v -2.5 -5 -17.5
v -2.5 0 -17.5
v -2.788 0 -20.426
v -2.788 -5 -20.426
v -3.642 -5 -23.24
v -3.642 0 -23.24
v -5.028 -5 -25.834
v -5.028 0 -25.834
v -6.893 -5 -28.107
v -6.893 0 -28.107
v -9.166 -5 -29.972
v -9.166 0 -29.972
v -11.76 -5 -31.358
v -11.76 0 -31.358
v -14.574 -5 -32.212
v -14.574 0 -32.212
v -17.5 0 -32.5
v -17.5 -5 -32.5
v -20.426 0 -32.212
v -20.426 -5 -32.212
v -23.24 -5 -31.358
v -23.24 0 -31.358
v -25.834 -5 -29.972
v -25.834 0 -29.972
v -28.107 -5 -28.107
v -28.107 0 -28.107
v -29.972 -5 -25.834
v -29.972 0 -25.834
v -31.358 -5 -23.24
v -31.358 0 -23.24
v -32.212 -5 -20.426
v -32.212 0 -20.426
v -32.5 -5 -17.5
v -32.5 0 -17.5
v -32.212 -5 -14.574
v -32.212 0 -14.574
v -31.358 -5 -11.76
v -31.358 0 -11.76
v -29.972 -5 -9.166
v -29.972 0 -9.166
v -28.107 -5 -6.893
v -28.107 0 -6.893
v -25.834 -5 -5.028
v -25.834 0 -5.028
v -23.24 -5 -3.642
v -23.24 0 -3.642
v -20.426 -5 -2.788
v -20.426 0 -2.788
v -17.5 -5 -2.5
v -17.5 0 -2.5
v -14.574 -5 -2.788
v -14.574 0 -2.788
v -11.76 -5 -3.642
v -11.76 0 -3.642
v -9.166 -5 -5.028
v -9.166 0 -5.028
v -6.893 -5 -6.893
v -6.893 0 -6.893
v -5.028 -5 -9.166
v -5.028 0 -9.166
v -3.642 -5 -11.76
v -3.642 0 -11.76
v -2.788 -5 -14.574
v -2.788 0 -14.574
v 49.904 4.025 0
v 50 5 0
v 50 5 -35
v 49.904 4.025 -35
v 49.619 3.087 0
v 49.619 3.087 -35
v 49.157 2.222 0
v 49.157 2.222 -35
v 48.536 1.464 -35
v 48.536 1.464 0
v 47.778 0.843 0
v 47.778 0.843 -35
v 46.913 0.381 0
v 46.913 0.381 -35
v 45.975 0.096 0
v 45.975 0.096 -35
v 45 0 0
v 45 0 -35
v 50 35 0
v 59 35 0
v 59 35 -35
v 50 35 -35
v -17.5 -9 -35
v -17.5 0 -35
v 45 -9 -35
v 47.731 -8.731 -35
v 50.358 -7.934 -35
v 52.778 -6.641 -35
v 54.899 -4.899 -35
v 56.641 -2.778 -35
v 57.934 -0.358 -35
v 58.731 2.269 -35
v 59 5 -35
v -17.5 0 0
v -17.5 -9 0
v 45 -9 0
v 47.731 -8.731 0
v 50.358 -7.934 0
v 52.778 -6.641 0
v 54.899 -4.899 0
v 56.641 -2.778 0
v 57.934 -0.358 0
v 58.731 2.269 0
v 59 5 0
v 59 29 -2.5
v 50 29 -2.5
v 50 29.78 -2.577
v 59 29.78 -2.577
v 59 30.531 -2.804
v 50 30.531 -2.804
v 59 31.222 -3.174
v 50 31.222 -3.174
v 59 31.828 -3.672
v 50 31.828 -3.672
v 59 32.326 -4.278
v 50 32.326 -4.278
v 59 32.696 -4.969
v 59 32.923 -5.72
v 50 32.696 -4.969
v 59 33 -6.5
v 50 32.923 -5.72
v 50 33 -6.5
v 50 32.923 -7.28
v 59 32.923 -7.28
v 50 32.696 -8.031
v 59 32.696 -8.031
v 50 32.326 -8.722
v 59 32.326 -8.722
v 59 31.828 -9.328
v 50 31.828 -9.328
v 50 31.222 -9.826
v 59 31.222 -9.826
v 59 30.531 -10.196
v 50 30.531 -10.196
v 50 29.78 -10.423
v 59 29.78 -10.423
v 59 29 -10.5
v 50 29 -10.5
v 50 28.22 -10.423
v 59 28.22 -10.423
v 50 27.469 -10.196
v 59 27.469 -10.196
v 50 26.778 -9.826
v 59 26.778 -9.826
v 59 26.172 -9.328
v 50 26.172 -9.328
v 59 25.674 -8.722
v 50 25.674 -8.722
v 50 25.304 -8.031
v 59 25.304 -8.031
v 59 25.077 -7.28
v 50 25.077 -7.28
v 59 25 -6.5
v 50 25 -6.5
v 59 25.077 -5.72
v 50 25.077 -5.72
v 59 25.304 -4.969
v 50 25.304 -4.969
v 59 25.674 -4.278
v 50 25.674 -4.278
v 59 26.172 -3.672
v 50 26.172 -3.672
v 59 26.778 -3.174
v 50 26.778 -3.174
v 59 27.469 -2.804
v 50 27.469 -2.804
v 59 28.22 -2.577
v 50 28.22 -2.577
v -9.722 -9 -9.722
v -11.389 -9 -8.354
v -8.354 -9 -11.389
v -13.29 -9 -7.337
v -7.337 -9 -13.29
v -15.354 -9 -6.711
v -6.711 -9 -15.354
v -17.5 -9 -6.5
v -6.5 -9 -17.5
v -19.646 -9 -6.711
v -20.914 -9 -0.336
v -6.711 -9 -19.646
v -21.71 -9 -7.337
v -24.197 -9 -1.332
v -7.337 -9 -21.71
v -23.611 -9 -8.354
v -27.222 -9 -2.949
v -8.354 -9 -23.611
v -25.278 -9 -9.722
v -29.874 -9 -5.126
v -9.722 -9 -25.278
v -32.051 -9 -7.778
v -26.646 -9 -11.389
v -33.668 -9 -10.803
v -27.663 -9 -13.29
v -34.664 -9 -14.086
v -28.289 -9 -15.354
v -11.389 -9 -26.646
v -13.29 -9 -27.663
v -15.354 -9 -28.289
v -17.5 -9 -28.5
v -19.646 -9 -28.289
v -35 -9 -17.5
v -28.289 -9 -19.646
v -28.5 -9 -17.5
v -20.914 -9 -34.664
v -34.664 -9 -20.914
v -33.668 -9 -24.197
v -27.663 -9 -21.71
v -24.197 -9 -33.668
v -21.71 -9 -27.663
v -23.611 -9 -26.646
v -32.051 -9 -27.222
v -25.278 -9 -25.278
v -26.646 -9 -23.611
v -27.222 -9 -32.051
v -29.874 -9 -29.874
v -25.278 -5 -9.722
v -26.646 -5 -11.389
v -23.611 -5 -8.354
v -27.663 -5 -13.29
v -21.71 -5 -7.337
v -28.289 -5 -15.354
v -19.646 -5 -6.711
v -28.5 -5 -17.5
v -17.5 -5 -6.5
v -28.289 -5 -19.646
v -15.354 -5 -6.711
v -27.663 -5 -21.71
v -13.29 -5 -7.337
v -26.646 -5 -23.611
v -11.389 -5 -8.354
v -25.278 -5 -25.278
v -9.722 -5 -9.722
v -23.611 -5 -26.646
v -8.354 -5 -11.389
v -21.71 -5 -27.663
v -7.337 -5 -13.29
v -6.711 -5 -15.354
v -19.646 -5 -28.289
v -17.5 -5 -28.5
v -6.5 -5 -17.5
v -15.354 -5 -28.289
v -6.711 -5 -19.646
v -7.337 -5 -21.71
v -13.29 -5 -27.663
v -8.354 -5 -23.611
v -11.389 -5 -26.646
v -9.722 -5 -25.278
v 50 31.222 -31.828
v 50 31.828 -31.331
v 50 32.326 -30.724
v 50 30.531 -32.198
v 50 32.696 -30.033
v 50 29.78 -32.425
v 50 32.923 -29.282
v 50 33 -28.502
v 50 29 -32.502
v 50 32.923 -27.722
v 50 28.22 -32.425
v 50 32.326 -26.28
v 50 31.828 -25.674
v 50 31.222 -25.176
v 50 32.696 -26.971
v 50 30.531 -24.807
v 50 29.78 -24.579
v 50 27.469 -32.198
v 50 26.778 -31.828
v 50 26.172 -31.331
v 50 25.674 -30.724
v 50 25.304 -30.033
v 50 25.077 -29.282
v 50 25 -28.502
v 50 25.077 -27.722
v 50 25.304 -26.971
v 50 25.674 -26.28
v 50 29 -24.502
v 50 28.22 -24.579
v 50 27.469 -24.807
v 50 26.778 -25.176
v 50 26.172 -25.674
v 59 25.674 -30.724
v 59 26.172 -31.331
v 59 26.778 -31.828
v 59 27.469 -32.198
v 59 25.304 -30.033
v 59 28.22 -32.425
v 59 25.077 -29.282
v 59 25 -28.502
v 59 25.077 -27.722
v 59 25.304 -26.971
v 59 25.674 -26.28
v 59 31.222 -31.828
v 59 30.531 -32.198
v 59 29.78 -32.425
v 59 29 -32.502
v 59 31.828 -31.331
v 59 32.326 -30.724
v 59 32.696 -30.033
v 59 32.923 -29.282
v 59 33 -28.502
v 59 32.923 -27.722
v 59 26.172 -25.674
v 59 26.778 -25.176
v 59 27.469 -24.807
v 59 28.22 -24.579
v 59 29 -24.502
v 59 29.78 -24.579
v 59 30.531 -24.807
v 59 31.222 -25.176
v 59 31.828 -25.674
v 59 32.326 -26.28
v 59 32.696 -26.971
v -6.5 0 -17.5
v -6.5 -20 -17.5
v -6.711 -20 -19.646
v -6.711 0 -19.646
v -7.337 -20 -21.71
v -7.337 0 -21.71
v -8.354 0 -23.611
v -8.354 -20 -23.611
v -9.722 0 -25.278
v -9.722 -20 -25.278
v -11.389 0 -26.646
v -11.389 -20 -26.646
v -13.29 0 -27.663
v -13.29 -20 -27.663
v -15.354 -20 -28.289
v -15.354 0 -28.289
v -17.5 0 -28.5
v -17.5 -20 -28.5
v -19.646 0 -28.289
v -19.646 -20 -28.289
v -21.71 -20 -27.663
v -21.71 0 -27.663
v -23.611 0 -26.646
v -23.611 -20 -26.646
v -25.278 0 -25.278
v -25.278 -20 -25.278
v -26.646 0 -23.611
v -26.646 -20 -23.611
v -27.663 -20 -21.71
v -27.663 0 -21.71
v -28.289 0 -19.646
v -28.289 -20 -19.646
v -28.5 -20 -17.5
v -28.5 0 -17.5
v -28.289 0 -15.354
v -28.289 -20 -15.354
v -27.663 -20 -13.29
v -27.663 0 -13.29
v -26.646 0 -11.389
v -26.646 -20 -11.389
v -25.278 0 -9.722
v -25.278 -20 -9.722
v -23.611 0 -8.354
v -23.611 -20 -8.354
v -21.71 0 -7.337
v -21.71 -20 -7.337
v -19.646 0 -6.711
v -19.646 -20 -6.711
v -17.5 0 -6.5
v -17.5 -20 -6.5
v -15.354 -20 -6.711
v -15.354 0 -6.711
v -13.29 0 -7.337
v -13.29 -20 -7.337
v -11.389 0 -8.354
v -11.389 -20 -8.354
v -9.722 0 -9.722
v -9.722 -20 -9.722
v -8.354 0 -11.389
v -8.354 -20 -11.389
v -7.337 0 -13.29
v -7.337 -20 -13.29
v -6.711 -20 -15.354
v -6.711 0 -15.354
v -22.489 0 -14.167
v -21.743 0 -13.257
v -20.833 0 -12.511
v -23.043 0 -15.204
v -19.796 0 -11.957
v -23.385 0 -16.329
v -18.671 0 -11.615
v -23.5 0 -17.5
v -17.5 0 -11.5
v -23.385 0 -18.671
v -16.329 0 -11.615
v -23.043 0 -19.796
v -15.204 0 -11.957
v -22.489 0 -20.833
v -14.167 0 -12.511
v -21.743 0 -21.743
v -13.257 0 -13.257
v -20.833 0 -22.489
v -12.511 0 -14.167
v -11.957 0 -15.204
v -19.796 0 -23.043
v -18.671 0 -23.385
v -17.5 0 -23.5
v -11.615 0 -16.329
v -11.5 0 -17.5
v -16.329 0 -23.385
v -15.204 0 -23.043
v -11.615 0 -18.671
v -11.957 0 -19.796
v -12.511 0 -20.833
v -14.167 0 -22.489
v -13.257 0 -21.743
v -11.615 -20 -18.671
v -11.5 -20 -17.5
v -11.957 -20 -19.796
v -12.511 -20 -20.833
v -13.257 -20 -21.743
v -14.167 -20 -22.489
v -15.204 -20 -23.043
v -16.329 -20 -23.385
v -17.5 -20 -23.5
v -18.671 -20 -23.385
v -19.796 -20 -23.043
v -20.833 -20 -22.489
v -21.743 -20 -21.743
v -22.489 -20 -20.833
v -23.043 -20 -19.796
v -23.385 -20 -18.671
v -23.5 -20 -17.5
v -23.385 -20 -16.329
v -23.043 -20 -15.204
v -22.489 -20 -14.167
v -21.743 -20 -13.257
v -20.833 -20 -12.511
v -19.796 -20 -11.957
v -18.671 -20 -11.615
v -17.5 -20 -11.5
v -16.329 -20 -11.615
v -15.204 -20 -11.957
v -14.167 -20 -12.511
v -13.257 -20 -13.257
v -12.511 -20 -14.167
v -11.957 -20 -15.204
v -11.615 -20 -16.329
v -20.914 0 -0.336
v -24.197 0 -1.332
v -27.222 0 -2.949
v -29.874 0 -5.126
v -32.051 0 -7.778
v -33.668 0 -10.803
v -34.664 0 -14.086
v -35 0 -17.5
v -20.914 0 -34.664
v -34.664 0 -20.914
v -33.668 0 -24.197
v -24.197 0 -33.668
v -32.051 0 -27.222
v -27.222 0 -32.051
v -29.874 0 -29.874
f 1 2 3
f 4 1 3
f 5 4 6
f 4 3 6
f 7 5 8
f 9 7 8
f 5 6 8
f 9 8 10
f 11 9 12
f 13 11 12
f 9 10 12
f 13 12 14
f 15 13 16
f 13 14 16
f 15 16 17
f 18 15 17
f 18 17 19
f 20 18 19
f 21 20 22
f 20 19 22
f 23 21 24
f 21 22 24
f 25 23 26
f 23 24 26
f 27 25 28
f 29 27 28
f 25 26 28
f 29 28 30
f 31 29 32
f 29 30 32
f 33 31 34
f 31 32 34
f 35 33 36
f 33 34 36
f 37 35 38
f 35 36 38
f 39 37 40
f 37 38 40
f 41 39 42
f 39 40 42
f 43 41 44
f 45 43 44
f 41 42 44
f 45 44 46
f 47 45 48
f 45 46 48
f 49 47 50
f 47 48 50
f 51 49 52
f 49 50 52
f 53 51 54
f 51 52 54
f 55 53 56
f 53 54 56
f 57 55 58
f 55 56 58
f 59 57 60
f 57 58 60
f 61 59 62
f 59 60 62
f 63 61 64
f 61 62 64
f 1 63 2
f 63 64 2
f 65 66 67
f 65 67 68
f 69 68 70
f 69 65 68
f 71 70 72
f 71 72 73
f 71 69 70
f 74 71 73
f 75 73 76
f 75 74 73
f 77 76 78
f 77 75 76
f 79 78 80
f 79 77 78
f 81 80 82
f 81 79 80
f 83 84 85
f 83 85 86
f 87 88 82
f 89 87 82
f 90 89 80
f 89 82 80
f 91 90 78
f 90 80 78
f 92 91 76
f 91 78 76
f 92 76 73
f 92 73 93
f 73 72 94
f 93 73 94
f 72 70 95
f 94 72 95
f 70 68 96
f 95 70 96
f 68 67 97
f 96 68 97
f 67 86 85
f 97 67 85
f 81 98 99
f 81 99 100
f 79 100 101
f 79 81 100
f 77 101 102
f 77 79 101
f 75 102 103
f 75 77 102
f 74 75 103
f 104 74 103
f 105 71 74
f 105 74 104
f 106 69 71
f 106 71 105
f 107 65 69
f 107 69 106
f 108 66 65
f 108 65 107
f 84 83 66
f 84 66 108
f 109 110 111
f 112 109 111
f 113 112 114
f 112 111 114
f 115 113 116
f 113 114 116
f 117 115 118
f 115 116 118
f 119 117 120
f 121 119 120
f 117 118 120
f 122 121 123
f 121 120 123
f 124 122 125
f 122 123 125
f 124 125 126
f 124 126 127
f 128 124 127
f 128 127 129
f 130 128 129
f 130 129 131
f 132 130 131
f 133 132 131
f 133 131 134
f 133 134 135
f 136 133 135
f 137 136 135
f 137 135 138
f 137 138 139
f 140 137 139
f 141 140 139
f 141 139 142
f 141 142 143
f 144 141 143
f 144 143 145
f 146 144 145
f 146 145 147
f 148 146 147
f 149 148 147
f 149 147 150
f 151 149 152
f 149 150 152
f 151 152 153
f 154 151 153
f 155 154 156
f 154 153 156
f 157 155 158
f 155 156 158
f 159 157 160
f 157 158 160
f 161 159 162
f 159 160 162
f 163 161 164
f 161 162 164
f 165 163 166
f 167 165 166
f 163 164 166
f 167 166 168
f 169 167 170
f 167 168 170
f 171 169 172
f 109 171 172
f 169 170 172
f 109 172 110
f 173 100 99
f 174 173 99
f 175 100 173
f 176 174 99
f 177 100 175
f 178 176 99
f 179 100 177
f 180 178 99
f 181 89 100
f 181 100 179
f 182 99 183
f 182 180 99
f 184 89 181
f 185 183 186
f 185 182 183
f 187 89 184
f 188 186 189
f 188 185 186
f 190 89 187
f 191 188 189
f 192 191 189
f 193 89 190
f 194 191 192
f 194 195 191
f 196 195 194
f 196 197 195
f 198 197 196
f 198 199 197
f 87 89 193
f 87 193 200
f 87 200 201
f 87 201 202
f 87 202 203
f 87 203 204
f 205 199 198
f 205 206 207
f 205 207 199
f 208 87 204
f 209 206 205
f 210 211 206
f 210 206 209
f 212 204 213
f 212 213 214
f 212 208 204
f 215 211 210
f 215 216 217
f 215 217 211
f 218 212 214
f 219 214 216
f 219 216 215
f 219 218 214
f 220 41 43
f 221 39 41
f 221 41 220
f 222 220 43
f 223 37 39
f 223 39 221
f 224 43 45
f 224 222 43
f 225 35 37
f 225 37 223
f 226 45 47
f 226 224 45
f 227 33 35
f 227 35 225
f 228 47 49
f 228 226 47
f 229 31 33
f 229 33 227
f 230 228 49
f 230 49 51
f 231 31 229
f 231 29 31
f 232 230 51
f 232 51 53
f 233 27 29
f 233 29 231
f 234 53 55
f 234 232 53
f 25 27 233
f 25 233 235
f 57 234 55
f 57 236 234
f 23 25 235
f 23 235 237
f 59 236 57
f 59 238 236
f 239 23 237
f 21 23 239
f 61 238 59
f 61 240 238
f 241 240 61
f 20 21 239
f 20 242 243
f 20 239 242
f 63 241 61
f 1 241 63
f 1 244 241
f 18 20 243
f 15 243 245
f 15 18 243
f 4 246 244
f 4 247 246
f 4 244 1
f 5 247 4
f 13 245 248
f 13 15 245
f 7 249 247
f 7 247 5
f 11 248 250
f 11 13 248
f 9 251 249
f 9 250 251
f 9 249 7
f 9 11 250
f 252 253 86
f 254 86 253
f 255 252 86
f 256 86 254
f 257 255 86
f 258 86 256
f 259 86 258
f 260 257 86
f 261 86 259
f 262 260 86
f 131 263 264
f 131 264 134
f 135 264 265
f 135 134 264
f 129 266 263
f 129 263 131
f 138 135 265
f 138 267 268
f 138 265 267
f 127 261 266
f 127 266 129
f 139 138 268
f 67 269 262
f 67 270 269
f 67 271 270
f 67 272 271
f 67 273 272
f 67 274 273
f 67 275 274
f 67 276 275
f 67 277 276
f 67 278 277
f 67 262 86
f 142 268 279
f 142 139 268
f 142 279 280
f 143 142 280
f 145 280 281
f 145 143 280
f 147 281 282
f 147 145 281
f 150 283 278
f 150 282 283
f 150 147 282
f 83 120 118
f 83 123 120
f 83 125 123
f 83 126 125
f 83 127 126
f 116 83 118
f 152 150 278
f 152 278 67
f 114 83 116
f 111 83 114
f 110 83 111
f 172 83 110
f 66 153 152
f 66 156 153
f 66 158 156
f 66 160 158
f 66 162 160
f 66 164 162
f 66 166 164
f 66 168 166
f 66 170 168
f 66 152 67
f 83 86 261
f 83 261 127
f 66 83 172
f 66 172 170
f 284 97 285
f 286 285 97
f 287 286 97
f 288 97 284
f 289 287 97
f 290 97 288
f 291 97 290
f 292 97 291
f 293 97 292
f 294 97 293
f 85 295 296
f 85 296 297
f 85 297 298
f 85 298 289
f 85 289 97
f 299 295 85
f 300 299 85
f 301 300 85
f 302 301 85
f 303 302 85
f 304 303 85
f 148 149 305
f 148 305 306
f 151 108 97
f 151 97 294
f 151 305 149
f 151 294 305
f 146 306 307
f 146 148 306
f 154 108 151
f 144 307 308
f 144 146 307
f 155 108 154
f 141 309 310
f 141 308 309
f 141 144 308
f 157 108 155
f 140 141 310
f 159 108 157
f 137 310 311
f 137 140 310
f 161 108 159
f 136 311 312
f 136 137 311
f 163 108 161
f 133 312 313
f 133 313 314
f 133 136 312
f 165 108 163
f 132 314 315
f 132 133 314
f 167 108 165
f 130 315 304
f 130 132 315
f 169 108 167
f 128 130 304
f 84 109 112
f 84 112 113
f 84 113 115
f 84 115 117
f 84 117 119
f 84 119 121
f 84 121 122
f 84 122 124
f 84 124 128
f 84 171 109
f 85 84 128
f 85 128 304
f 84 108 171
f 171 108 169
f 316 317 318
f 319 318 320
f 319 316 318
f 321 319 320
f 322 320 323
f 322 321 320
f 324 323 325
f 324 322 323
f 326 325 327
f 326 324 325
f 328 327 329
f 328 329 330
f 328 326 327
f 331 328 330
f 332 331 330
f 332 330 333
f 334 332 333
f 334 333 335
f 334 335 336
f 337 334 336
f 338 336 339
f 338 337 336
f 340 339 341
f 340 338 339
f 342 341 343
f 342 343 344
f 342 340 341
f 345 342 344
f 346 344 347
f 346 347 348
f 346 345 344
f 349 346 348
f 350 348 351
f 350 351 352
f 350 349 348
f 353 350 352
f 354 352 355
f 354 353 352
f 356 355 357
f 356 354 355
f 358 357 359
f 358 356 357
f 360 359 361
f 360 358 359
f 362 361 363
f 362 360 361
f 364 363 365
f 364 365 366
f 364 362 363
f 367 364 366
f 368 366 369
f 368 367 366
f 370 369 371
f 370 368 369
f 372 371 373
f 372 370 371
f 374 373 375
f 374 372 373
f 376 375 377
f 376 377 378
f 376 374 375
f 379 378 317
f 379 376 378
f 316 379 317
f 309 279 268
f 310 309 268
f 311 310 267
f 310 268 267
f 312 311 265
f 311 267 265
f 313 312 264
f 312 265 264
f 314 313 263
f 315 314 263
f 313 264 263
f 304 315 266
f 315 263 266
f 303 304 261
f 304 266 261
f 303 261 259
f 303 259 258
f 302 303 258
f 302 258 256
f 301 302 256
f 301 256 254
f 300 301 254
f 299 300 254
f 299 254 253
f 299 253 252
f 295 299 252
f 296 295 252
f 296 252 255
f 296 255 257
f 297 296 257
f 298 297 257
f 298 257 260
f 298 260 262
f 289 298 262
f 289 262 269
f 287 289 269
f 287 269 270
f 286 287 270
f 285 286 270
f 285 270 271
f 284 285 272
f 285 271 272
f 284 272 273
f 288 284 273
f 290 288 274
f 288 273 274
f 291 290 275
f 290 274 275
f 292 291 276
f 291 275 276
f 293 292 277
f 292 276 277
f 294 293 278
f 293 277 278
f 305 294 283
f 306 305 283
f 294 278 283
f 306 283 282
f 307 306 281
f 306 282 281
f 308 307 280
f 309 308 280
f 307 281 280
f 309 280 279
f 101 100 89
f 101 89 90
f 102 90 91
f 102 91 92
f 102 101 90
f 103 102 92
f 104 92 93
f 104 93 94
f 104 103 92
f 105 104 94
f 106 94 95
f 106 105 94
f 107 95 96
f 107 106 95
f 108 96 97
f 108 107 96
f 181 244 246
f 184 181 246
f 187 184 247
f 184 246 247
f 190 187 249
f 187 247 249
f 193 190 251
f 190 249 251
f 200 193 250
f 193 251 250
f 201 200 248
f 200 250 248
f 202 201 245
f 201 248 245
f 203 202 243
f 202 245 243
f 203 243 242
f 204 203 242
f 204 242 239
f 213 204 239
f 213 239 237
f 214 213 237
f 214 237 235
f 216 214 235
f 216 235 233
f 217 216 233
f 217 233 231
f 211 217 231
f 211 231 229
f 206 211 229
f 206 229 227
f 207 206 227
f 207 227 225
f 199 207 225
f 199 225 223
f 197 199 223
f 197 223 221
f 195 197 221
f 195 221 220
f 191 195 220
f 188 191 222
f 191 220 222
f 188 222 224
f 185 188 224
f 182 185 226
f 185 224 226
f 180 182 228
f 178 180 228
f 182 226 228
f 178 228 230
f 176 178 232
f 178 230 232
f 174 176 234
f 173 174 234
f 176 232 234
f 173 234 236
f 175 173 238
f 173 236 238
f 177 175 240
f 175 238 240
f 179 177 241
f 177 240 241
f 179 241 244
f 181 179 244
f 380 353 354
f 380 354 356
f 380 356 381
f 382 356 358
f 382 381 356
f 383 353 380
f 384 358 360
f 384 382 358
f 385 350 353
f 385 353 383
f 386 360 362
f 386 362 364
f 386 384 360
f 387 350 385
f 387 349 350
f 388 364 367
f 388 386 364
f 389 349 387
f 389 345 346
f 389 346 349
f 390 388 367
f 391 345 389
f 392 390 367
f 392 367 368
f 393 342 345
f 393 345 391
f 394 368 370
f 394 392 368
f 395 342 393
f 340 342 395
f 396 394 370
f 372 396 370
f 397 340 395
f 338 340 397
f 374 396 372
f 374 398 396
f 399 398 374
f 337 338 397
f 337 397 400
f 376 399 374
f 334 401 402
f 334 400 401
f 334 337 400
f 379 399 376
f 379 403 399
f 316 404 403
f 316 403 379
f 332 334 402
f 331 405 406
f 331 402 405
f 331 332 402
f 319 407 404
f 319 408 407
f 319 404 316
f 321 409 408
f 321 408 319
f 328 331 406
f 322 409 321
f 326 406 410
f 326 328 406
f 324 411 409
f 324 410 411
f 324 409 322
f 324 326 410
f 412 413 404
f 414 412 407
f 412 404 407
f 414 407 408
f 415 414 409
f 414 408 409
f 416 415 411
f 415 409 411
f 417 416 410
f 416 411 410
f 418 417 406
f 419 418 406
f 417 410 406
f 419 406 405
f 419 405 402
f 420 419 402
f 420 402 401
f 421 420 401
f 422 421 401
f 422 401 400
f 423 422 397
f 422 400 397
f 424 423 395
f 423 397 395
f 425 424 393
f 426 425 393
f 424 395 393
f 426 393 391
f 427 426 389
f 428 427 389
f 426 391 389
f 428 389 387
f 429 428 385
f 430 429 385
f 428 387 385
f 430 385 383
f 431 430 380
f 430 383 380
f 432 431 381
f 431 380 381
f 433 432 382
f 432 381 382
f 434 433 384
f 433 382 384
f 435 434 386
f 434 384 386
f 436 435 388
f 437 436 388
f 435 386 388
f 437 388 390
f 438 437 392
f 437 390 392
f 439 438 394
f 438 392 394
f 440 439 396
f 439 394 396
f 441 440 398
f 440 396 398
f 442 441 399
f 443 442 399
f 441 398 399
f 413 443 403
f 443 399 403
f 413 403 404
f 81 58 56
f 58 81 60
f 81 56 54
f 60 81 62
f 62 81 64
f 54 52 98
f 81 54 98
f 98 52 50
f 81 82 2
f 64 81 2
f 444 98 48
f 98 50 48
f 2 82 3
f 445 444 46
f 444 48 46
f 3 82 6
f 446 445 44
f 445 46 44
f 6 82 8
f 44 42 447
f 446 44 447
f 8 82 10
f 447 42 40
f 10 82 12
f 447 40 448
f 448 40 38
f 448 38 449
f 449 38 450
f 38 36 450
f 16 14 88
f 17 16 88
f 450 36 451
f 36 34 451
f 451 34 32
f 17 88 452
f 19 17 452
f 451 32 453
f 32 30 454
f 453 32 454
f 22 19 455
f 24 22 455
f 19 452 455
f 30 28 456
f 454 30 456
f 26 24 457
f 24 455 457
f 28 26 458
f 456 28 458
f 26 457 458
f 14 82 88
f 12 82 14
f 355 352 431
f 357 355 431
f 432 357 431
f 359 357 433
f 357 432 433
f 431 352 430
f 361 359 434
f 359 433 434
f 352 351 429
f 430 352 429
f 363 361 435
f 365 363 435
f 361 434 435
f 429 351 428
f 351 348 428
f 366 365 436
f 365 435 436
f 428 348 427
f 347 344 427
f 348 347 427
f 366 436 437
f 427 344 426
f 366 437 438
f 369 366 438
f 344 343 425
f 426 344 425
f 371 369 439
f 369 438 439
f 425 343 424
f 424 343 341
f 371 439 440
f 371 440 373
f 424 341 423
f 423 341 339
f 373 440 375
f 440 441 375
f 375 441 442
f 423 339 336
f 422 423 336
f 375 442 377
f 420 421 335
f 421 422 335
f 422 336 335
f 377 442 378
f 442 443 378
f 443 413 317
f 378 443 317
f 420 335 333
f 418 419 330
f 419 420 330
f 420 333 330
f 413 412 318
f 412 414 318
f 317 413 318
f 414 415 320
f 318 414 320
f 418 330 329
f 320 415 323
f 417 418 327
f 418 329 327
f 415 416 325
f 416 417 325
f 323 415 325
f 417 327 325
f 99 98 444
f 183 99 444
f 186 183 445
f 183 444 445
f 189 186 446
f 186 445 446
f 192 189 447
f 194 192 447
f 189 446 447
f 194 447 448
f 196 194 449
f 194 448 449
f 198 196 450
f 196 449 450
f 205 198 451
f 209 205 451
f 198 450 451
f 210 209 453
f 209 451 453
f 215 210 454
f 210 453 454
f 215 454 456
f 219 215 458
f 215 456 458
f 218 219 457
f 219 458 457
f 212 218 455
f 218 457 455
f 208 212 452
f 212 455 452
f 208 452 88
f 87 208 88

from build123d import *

# Parameters (mm, degrees)
BOSS_EXTRUDE1_DEPTH = 35
BOSS_EXTRUDE2_DEPTH = 9
SKETCH12_R          = 11
SKETCH12_R_2        = 6
BOSS_EXTRUDE3_DEPTH = 20
SKETCH7_R           = 4
CUT_EXTRUDE1_DEPTH  = 35
SKETCH9_R           = 15
CUT_EXTRUDE2_DEPTH  = 5
SKETCH10_R          = 11
CUT_EXTRUDE3_DEPTH  = 25


with BuildPart() as part:
    # Sketch5 → Boss-Extrude1 (new body)
    with BuildSketch(Plane.XY):
        with BuildLine():
            Line((-17.5, 0), (-17.5, -9))
            Line((-17.5, -9), (45, -9))
            ThreePointArc((45, -9), (54.899494937, -4.899494937), (59, 5))
            Line((59, 5), (59, 35))
            Line((59, 35), (50, 35))
            Line((50, 35), (50, 5))
            ThreePointArc((50, 5), (48.535533906, 1.464466094), (45, 0))
            Line((45, 0), (-17.5, 0))
        make_face()
    extrude(amount=-BOSS_EXTRUDE1_DEPTH)

    # Sketch8 → Boss-Extrude2 (add)
    with BuildSketch(Plane(origin=(0, 0, 0), x_dir=(1, 0, 0), z_dir=(0, 1, 0))):
        with BuildLine():
            Line((-17.5, 35), (-17.5, 0))
            ThreePointArc((-17.5, 0), (-35, 17.5), (-17.5, 35))
        make_face()
    extrude(amount=-BOSS_EXTRUDE2_DEPTH)

    # Sketch7 → Cut-Extrude1 (cut)
    with BuildSketch(Plane.ZY.offset(-50)):
        with Locations((-28.502110987, 29)):
            Circle(SKETCH7_R)
        with Locations((-6.5, 29)):
            Circle(SKETCH7_R)
    extrude(amount=-CUT_EXTRUDE1_DEPTH, mode=Mode.SUBTRACT)

    # Sketch9 → Cut-Extrude2 (cut)
    with BuildSketch(Plane(origin=(0, 0, 0), x_dir=(1, 0, 0), z_dir=(0, 1, 0))):
        with Locations((-17.5, 17.5)):
            Circle(SKETCH9_R)
    extrude(amount=-CUT_EXTRUDE2_DEPTH, mode=Mode.SUBTRACT)

    # Sketch10 → Cut-Extrude3 (cut)
    with BuildSketch(Plane(origin=(0, -5, 0), x_dir=(1, 0, 0), z_dir=(0, 1, 0))):
        with Locations((-17.5, 17.5)):
            Circle(SKETCH10_R)
    extrude(amount=-CUT_EXTRUDE3_DEPTH, mode=Mode.SUBTRACT)


with BuildPart() as body_2:
    # Sketch12 → Boss-Extrude3 (new body)
    with BuildSketch(Plane(origin=(0, 0, 0), x_dir=(1, 0, 0), z_dir=(0, 1, 0))):
        with Locations((-17.5, 17.5)):
            Circle(SKETCH12_R)
        with Locations((-17.5, 17.5)):
            Circle(SKETCH12_R_2, mode=Mode.SUBTRACT)
    extrude(amount=-BOSS_EXTRUDE3_DEPTH)


solid = Compound([part.part, body_2.part])
